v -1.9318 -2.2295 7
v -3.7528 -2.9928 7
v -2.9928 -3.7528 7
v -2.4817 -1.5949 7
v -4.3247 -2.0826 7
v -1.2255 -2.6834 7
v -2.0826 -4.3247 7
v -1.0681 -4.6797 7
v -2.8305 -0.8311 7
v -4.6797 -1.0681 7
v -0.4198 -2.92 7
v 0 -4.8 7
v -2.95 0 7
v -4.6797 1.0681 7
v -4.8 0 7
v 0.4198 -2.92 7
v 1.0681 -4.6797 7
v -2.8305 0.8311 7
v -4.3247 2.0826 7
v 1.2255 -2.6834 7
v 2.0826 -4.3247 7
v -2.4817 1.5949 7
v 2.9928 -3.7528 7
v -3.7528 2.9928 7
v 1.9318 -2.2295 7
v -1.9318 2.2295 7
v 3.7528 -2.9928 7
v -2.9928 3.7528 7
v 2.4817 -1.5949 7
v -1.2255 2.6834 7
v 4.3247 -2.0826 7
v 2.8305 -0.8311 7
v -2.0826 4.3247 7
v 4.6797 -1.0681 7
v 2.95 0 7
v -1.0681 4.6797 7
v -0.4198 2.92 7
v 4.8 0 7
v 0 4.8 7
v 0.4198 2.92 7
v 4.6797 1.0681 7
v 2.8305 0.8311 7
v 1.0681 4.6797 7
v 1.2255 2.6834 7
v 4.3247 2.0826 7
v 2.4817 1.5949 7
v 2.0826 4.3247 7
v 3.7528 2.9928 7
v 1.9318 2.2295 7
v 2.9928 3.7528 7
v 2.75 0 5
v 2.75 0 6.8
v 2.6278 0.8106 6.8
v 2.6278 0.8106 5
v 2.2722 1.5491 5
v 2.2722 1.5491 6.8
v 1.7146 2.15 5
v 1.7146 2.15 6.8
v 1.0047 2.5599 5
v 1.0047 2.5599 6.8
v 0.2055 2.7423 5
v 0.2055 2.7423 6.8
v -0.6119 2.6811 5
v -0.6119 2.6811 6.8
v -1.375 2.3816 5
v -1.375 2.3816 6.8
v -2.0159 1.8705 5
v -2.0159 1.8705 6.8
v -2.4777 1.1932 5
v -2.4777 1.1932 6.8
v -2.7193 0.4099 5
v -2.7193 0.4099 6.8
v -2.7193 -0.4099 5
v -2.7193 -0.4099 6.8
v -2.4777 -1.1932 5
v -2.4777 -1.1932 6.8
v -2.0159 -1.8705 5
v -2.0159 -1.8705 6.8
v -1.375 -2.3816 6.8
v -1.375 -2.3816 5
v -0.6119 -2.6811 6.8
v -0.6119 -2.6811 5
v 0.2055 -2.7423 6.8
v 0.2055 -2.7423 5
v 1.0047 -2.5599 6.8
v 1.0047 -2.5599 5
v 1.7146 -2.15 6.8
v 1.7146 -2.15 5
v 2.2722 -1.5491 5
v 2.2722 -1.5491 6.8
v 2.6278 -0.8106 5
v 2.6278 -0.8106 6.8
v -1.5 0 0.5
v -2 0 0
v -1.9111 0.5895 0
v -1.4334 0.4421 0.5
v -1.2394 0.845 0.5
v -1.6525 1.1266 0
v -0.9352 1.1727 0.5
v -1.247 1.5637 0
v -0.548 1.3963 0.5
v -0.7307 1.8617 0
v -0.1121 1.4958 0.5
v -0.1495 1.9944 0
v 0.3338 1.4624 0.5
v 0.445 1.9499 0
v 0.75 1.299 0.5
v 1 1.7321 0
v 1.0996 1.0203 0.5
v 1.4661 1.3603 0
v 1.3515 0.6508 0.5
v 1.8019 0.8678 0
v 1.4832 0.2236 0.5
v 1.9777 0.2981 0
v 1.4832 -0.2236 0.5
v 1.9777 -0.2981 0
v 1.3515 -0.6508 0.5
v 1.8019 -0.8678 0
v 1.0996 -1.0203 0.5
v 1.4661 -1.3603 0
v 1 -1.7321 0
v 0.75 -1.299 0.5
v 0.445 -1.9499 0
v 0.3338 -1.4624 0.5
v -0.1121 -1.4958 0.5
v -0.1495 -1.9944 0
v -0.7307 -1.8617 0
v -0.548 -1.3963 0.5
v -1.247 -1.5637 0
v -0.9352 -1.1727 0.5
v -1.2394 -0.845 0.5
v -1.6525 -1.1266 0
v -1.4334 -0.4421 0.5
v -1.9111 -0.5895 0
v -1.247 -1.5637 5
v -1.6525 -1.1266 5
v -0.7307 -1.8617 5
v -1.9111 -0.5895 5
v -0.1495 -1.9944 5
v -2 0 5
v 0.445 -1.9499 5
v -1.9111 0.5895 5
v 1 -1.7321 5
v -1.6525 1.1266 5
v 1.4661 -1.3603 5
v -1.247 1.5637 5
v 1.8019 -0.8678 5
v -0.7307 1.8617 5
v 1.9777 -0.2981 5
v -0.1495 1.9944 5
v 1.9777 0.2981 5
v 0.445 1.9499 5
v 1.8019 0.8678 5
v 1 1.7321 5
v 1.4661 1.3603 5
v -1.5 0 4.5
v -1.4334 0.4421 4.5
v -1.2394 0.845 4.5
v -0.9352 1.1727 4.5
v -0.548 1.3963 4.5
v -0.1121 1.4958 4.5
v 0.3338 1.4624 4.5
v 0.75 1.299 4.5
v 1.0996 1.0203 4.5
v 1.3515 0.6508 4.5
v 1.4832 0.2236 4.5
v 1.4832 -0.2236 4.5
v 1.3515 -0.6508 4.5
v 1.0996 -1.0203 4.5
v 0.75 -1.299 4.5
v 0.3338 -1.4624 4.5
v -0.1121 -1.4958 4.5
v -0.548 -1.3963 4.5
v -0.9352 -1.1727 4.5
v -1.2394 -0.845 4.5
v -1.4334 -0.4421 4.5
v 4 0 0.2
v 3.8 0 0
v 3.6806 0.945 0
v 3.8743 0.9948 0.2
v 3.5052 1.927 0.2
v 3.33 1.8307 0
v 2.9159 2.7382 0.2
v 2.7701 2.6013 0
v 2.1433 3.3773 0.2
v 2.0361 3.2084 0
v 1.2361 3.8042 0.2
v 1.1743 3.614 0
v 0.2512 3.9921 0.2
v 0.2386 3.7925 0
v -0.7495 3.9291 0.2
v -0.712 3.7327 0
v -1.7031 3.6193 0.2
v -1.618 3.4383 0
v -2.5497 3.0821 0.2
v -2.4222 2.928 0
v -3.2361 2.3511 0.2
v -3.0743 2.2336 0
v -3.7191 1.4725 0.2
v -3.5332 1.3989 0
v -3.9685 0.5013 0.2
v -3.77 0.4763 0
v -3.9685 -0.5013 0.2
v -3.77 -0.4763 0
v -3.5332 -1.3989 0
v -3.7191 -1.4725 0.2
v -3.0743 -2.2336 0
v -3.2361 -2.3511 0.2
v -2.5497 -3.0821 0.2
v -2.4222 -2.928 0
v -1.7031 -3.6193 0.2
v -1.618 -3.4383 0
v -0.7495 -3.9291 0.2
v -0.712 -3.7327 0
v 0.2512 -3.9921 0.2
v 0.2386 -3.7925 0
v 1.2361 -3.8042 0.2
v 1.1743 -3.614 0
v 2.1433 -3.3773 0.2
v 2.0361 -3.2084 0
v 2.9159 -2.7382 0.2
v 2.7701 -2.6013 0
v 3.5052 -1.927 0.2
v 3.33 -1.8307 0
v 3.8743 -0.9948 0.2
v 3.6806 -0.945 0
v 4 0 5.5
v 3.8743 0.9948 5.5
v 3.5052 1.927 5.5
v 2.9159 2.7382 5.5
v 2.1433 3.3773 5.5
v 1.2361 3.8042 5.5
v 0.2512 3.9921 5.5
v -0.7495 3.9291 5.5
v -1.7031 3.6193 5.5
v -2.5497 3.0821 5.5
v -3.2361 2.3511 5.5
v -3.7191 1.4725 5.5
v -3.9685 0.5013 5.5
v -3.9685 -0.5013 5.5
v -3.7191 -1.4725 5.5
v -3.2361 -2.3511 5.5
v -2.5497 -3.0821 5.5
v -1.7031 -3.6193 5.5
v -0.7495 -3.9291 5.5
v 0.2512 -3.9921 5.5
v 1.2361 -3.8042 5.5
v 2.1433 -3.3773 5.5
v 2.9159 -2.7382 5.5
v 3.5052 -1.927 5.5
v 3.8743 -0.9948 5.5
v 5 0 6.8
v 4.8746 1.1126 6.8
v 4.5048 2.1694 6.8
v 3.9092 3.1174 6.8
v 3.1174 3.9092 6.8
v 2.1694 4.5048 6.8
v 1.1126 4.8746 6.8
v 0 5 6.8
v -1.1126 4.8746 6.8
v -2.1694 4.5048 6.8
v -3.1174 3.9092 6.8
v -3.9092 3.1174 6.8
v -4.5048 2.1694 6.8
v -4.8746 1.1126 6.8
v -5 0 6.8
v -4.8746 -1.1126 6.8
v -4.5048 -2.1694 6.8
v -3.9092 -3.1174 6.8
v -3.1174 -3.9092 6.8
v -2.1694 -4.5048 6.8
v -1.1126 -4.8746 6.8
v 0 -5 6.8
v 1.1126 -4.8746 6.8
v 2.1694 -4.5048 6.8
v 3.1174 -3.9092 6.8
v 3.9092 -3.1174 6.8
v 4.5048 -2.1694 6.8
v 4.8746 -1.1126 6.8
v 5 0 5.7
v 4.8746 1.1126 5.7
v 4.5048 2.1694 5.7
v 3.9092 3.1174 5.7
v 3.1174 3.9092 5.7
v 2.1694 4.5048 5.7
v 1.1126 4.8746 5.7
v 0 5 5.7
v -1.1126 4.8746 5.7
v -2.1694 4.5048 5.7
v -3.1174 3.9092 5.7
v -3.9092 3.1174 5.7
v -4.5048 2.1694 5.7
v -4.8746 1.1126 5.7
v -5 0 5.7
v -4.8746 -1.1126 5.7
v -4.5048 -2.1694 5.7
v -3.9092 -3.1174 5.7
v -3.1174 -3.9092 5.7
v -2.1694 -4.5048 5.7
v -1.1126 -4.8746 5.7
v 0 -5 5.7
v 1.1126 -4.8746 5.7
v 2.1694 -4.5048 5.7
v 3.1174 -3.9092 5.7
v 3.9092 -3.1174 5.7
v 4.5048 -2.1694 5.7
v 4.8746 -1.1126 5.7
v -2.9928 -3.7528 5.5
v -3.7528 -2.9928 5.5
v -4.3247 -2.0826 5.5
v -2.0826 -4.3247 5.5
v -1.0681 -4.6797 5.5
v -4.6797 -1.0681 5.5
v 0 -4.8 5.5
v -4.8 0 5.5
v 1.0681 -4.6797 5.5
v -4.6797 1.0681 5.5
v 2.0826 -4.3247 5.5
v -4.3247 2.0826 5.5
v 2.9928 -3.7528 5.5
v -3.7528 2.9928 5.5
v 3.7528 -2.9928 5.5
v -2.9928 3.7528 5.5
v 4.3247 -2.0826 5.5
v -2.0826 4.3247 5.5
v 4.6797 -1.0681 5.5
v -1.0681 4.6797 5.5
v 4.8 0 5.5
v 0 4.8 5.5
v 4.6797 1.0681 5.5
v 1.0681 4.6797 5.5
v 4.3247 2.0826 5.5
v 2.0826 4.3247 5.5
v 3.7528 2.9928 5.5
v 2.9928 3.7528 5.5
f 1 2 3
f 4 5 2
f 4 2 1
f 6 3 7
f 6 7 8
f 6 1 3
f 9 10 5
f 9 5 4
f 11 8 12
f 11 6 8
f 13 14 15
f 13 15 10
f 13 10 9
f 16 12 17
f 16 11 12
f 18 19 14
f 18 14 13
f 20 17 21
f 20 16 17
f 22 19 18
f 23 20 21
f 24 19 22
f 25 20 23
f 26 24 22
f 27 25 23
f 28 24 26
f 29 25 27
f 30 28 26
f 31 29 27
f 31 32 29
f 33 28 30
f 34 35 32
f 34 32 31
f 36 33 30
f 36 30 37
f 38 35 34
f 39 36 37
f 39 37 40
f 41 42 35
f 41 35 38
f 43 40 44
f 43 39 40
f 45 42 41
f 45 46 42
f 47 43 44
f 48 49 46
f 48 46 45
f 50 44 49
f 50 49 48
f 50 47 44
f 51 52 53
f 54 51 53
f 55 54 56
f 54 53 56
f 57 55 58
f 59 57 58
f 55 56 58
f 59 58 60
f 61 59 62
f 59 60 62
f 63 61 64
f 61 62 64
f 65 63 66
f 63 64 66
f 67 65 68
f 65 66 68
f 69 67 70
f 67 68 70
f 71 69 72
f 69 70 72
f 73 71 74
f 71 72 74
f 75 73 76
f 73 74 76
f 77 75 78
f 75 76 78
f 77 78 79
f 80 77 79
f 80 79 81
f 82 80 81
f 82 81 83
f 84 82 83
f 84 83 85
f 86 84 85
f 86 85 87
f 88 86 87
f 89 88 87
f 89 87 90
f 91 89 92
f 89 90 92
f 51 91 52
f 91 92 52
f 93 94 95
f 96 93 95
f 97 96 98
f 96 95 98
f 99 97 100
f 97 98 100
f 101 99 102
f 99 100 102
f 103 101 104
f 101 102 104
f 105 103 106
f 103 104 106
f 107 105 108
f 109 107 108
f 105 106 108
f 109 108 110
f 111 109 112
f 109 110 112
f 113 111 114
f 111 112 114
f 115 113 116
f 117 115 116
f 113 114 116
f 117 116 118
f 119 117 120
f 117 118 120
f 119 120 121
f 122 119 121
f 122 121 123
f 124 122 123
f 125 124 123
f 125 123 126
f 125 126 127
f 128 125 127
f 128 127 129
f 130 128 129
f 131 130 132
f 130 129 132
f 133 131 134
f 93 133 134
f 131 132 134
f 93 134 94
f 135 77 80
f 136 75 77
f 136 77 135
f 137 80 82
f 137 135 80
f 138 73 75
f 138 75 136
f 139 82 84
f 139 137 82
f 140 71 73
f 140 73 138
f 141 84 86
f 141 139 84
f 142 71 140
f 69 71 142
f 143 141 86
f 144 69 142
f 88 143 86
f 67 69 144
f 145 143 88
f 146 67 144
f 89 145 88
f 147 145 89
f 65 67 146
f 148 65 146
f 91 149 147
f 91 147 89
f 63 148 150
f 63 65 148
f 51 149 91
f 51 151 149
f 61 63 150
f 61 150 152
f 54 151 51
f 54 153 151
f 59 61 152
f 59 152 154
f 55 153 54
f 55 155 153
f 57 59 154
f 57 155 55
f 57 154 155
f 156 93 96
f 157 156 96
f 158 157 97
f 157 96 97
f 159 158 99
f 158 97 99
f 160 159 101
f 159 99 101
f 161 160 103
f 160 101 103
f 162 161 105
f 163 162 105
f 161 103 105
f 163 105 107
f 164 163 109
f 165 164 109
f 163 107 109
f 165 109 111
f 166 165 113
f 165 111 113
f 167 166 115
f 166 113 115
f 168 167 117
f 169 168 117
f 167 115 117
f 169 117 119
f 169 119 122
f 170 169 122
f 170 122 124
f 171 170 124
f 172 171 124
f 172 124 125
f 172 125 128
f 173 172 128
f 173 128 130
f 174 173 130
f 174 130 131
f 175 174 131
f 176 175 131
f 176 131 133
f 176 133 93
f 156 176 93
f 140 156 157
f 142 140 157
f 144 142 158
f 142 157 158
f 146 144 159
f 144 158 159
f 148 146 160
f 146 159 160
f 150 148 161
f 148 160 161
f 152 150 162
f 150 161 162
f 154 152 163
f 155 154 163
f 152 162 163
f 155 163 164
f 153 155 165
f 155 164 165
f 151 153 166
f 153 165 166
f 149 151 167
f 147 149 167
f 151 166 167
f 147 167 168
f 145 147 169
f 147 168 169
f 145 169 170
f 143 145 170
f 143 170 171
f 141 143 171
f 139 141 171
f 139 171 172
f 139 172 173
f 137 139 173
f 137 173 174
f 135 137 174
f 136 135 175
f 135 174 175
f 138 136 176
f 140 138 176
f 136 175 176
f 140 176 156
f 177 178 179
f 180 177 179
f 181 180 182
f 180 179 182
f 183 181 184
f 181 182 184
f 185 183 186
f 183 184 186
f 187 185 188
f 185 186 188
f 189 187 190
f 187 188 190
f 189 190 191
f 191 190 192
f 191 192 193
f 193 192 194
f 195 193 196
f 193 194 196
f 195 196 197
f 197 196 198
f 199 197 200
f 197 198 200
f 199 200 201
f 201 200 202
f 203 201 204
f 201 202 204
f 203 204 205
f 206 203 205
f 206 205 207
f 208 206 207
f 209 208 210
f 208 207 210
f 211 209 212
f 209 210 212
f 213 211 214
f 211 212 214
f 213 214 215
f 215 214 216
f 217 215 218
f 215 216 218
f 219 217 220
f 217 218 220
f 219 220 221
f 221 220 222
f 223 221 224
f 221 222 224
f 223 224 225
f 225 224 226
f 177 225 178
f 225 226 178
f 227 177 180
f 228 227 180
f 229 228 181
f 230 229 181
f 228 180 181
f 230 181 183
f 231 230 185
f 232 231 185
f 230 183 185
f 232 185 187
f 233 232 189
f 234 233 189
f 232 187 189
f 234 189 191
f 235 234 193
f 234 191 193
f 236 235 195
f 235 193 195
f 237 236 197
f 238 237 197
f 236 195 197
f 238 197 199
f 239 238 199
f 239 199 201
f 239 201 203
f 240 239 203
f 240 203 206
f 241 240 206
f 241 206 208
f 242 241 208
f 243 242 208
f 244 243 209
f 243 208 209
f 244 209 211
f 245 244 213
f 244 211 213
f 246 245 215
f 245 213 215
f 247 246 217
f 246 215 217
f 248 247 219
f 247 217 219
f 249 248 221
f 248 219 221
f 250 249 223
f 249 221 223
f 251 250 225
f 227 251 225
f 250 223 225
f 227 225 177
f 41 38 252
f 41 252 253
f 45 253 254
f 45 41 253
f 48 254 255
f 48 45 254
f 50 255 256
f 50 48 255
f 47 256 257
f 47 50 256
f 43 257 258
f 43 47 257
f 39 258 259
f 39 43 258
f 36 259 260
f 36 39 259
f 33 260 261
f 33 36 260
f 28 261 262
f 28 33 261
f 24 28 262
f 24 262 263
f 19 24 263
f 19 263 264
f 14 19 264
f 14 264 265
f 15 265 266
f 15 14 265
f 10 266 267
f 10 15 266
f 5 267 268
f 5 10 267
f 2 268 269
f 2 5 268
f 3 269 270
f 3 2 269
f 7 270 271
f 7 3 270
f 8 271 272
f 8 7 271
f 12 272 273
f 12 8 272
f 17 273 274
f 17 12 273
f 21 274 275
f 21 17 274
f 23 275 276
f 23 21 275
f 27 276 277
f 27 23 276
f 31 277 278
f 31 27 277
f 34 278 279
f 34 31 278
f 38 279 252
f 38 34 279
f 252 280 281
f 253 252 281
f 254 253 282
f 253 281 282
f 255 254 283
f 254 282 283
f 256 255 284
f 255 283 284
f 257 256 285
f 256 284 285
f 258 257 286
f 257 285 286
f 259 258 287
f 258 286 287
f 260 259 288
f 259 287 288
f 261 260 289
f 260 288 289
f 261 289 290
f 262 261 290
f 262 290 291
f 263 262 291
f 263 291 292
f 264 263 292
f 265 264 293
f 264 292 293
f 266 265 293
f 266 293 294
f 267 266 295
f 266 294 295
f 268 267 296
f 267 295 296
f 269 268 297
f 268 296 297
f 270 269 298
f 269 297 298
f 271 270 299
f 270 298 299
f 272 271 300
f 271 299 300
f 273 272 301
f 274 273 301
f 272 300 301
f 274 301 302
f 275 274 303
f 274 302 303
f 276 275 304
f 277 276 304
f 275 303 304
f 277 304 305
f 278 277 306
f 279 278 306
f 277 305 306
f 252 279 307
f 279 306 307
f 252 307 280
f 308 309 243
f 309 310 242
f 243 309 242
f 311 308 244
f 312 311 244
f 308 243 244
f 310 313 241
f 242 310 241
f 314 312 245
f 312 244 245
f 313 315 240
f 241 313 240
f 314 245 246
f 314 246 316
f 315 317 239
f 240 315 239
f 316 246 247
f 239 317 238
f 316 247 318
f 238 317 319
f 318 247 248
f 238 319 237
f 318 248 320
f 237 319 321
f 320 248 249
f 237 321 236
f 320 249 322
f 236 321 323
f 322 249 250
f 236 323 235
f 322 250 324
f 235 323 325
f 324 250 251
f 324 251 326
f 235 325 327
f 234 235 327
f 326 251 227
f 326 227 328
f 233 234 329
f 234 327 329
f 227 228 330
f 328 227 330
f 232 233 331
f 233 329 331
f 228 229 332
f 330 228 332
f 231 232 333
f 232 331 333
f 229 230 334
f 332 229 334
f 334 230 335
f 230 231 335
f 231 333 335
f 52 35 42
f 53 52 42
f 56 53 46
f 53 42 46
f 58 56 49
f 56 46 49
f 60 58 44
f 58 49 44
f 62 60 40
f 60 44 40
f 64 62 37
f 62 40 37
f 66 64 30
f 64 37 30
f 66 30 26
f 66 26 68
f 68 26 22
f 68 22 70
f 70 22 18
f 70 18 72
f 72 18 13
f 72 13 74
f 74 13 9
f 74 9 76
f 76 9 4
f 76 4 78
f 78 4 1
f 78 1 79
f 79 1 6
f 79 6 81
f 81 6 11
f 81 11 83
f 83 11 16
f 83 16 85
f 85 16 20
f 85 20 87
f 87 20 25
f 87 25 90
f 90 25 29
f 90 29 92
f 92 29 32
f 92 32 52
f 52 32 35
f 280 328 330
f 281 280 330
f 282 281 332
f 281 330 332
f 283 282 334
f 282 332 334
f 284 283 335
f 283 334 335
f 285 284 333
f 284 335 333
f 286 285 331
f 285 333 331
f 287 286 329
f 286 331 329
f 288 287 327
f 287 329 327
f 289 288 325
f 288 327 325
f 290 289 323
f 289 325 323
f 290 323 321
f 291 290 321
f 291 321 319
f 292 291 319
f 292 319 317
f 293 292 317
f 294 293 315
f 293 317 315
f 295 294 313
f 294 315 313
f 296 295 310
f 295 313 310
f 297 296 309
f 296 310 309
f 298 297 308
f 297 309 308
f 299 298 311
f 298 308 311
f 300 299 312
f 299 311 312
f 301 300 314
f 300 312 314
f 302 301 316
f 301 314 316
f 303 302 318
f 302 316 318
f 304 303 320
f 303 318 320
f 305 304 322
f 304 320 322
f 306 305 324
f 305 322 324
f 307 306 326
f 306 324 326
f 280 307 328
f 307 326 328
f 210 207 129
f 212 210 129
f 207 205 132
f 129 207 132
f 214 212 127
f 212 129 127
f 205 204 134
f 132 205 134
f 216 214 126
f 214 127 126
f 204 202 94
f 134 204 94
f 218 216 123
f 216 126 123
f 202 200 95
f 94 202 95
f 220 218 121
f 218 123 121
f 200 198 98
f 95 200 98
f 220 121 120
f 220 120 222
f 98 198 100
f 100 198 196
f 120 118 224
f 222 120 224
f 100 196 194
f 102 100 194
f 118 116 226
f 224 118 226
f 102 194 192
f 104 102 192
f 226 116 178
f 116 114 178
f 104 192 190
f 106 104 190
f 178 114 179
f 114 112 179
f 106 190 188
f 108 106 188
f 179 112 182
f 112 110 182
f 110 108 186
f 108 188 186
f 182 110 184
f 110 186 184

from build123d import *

# Parameters (mm, degrees)
SKETCH_1_R          = 4
EXTRUDE_1_DEPTH     = 5.5
SKETCH_2_R          = 5
EXTRUDE_2_DEPTH     = 1.5
SKETCH_3_R          = 2.75
CUT_EXTRUDE_1_DEPTH = 2
SKETCH_4_R          = 1.5
CUT_EXTRUDE_2_DEPTH = 8
CHAMFER_1_SIZE      = 0.2
CHAMFER_2_SIZE      = 0.2
CHAMFER_3_SIZE      = 0.2
CHAMFER_4_SIZE      = 0.5


with BuildPart() as part:
    # 草图1 → 拉伸1 (new body)
    with BuildSketch(Plane.XY):
        Circle(SKETCH_1_R)
    extrude(amount=EXTRUDE_1_DEPTH)

    # 草图2 → 拉伸2 (add)
    with BuildSketch(Plane.XY.offset(5.5)):
        Circle(SKETCH_2_R)
    extrude(amount=EXTRUDE_2_DEPTH)

    # 草图3 → 切除-拉伸1 (cut)
    with BuildSketch(Plane.XY.offset(7)):
        Circle(SKETCH_3_R)
    extrude(amount=-CUT_EXTRUDE_1_DEPTH, mode=Mode.SUBTRACT)

    # 草图4 → 切除-拉伸2 (cut, through all)
    with BuildSketch(Plane(origin=(0, 0, 0), x_dir=(-1, 0, 0), z_dir=(0, 0, -1))):
        Circle(SKETCH_4_R)
    extrude(amount=-CUT_EXTRUDE_2_DEPTH, mode=Mode.SUBTRACT)

    # 倒角1
    chamfer_1_edges = [part.edges().sort_by_distance(p)[0] for p in [
        (-5, 0, 5.5),
        (-5, 0, 7),
    ]]
    chamfer(chamfer_1_edges, length=CHAMFER_1_SIZE)

    # 倒角2
    chamfer_2_edges = [part.edges().sort_by_distance(p)[0] for p in [
        (-4, 0, 0),
    ]]
    chamfer(chamfer_2_edges, length=CHAMFER_2_SIZE)

    # 倒角3
    chamfer_3_edges = [part.edges().sort_by_distance(p)[0] for p in [
        (-2.75, 0, 7),
    ]]
    chamfer(chamfer_3_edges, length=CHAMFER_3_SIZE)

    # 倒角4
    chamfer_4_edges = [part.edges().sort_by_distance(p)[0] for p in [
        (1.5, 0, 5),
        (1.5, 0, 0),
    ]]
    chamfer(chamfer_4_edges, length=CHAMFER_4_SIZE)


solid = part.part
